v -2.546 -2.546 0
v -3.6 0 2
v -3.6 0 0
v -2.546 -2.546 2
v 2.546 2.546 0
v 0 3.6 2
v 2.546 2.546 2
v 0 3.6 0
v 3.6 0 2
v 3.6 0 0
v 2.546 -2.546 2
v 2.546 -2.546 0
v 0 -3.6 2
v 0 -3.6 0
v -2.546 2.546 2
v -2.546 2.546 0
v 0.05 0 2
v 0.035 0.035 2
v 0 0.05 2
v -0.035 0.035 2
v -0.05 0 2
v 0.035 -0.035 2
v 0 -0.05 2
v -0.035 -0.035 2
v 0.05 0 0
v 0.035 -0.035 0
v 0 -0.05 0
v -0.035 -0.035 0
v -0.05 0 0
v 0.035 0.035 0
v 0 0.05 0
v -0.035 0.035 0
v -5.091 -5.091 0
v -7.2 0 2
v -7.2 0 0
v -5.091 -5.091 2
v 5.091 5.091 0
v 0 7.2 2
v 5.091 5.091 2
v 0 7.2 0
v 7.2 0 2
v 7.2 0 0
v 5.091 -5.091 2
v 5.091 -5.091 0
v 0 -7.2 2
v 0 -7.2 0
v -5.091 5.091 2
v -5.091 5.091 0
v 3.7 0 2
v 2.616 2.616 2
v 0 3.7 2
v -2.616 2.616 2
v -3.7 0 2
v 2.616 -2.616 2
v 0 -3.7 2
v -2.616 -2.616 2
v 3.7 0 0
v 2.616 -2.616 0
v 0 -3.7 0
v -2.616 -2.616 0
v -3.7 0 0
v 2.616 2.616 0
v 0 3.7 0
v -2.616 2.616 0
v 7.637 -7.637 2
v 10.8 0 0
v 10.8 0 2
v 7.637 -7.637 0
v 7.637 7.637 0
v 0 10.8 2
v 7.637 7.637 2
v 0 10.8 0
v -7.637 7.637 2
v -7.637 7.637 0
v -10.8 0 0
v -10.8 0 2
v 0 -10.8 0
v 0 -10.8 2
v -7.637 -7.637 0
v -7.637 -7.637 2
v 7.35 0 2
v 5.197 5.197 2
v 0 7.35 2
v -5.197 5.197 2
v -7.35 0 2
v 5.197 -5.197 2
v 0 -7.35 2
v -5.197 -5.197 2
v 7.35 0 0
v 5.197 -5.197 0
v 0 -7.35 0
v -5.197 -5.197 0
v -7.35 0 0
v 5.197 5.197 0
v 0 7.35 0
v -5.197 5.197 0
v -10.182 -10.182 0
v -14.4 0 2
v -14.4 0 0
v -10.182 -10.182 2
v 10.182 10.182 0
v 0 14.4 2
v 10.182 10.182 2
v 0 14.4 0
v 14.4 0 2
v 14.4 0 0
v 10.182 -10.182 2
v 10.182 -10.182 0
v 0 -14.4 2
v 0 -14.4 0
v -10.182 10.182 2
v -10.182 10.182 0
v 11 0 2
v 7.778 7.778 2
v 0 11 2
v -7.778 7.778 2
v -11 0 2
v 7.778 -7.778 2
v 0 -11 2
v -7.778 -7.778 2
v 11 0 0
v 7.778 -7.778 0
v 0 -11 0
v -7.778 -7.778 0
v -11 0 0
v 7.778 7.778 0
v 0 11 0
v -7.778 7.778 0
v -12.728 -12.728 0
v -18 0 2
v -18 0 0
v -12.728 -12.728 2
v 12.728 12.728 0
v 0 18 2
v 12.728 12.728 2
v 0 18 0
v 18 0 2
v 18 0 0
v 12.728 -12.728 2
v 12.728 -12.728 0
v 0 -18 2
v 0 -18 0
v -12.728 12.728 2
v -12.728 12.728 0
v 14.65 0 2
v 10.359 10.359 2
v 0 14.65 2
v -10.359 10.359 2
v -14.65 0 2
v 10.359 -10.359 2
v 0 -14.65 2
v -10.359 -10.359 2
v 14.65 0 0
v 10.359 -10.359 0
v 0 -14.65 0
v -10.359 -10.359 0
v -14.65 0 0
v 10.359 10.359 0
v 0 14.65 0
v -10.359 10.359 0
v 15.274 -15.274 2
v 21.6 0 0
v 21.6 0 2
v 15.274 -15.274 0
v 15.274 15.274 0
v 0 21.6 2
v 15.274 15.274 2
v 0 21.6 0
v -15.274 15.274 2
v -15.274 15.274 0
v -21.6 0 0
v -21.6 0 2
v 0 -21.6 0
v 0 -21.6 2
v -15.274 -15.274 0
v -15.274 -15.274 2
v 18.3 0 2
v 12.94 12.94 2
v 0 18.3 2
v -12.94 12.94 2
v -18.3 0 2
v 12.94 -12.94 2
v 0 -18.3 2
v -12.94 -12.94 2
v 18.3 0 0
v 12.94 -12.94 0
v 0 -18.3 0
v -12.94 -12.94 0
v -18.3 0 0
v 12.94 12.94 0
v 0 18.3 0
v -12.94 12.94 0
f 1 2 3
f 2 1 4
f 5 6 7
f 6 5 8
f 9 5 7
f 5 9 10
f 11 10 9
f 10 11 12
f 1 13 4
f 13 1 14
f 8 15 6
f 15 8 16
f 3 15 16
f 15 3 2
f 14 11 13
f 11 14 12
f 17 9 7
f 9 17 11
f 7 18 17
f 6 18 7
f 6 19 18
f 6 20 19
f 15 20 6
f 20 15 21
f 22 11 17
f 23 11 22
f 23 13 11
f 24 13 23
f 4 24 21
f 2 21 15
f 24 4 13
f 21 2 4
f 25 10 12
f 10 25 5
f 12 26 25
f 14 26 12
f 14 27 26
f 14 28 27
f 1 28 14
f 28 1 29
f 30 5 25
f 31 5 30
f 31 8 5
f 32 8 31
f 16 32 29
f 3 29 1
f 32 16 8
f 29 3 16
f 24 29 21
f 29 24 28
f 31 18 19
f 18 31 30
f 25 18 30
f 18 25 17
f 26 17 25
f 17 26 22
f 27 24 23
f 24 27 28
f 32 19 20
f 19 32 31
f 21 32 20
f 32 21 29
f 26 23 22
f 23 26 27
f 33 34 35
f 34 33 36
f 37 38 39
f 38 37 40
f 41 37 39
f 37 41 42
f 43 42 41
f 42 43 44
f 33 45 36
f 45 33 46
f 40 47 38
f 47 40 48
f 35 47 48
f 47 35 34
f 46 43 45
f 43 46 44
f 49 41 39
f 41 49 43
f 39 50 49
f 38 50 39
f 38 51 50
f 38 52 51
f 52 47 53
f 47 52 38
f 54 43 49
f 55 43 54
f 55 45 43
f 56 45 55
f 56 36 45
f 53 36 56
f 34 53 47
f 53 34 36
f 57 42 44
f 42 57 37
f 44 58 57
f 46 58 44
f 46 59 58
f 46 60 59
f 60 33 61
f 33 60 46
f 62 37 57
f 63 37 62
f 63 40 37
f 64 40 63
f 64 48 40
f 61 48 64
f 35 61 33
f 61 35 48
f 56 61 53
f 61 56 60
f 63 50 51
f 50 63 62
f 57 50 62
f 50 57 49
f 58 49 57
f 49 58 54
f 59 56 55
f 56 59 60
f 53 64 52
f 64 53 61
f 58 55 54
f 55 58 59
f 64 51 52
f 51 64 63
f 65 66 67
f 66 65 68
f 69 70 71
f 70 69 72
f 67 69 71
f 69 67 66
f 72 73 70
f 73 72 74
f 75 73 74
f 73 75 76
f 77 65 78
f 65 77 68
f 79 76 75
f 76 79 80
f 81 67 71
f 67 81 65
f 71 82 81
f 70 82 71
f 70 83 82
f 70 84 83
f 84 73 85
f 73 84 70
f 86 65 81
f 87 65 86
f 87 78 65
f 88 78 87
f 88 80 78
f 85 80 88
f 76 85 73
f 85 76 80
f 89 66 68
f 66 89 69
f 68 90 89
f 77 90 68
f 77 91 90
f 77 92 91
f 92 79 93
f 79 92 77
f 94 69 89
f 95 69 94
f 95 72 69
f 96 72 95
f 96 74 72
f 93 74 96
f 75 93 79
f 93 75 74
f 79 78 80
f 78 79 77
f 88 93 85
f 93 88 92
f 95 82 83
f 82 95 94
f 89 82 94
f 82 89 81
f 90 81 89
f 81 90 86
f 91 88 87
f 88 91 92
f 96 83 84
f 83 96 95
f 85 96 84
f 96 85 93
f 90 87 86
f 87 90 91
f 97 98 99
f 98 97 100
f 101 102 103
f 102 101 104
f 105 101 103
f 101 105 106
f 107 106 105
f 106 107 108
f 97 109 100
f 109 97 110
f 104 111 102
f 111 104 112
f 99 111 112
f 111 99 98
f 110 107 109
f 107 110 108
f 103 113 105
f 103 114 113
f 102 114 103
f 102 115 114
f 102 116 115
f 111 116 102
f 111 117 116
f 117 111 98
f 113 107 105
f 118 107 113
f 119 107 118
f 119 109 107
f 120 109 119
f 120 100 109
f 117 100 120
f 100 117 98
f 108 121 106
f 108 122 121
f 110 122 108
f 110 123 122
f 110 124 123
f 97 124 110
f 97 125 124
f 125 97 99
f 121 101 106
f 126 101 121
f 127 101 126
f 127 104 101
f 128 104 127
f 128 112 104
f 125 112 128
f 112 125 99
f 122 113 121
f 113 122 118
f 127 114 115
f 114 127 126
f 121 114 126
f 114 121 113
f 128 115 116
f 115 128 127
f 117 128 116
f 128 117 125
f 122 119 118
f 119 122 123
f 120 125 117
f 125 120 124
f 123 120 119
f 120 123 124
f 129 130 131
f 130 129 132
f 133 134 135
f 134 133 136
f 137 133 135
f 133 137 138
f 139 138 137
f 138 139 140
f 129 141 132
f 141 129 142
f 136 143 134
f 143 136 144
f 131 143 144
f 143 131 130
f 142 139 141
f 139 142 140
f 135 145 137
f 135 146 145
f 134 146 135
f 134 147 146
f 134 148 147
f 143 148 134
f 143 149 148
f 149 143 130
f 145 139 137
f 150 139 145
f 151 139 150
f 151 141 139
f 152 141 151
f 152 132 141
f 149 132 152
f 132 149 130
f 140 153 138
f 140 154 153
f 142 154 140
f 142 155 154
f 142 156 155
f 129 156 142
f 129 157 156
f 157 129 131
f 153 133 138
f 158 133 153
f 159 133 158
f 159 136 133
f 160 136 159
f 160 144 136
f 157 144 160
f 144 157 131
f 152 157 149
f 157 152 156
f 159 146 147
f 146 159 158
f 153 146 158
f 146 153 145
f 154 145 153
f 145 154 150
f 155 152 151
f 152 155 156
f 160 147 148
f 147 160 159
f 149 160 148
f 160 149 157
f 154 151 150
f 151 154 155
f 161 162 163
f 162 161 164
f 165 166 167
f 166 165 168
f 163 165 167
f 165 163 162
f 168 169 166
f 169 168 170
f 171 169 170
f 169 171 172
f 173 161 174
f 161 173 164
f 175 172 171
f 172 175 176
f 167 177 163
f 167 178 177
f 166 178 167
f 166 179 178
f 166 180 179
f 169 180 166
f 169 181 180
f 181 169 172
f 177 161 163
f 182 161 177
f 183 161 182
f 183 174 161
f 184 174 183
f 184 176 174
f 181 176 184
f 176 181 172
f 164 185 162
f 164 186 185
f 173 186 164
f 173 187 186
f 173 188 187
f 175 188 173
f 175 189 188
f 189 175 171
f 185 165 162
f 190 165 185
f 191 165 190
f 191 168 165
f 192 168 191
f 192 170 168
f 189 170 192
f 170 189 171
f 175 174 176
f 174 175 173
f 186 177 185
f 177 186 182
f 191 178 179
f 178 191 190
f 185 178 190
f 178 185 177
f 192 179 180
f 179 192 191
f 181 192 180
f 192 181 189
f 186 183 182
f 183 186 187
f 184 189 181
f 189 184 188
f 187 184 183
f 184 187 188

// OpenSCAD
$fn=8;

linewidth = .6;
h=2;    //height
s=linewidth*12;    //step
q=6;

for(i=[s:s:s*q]){
    cl = .1*(i/s);
    echo(cl);
    difference(){
        echo(i);
        cylinder(d=i, h=h);

        translate([0,0,-.1])
        cylinder(d=i-s+cl, h=h+1);        
    }
}    
